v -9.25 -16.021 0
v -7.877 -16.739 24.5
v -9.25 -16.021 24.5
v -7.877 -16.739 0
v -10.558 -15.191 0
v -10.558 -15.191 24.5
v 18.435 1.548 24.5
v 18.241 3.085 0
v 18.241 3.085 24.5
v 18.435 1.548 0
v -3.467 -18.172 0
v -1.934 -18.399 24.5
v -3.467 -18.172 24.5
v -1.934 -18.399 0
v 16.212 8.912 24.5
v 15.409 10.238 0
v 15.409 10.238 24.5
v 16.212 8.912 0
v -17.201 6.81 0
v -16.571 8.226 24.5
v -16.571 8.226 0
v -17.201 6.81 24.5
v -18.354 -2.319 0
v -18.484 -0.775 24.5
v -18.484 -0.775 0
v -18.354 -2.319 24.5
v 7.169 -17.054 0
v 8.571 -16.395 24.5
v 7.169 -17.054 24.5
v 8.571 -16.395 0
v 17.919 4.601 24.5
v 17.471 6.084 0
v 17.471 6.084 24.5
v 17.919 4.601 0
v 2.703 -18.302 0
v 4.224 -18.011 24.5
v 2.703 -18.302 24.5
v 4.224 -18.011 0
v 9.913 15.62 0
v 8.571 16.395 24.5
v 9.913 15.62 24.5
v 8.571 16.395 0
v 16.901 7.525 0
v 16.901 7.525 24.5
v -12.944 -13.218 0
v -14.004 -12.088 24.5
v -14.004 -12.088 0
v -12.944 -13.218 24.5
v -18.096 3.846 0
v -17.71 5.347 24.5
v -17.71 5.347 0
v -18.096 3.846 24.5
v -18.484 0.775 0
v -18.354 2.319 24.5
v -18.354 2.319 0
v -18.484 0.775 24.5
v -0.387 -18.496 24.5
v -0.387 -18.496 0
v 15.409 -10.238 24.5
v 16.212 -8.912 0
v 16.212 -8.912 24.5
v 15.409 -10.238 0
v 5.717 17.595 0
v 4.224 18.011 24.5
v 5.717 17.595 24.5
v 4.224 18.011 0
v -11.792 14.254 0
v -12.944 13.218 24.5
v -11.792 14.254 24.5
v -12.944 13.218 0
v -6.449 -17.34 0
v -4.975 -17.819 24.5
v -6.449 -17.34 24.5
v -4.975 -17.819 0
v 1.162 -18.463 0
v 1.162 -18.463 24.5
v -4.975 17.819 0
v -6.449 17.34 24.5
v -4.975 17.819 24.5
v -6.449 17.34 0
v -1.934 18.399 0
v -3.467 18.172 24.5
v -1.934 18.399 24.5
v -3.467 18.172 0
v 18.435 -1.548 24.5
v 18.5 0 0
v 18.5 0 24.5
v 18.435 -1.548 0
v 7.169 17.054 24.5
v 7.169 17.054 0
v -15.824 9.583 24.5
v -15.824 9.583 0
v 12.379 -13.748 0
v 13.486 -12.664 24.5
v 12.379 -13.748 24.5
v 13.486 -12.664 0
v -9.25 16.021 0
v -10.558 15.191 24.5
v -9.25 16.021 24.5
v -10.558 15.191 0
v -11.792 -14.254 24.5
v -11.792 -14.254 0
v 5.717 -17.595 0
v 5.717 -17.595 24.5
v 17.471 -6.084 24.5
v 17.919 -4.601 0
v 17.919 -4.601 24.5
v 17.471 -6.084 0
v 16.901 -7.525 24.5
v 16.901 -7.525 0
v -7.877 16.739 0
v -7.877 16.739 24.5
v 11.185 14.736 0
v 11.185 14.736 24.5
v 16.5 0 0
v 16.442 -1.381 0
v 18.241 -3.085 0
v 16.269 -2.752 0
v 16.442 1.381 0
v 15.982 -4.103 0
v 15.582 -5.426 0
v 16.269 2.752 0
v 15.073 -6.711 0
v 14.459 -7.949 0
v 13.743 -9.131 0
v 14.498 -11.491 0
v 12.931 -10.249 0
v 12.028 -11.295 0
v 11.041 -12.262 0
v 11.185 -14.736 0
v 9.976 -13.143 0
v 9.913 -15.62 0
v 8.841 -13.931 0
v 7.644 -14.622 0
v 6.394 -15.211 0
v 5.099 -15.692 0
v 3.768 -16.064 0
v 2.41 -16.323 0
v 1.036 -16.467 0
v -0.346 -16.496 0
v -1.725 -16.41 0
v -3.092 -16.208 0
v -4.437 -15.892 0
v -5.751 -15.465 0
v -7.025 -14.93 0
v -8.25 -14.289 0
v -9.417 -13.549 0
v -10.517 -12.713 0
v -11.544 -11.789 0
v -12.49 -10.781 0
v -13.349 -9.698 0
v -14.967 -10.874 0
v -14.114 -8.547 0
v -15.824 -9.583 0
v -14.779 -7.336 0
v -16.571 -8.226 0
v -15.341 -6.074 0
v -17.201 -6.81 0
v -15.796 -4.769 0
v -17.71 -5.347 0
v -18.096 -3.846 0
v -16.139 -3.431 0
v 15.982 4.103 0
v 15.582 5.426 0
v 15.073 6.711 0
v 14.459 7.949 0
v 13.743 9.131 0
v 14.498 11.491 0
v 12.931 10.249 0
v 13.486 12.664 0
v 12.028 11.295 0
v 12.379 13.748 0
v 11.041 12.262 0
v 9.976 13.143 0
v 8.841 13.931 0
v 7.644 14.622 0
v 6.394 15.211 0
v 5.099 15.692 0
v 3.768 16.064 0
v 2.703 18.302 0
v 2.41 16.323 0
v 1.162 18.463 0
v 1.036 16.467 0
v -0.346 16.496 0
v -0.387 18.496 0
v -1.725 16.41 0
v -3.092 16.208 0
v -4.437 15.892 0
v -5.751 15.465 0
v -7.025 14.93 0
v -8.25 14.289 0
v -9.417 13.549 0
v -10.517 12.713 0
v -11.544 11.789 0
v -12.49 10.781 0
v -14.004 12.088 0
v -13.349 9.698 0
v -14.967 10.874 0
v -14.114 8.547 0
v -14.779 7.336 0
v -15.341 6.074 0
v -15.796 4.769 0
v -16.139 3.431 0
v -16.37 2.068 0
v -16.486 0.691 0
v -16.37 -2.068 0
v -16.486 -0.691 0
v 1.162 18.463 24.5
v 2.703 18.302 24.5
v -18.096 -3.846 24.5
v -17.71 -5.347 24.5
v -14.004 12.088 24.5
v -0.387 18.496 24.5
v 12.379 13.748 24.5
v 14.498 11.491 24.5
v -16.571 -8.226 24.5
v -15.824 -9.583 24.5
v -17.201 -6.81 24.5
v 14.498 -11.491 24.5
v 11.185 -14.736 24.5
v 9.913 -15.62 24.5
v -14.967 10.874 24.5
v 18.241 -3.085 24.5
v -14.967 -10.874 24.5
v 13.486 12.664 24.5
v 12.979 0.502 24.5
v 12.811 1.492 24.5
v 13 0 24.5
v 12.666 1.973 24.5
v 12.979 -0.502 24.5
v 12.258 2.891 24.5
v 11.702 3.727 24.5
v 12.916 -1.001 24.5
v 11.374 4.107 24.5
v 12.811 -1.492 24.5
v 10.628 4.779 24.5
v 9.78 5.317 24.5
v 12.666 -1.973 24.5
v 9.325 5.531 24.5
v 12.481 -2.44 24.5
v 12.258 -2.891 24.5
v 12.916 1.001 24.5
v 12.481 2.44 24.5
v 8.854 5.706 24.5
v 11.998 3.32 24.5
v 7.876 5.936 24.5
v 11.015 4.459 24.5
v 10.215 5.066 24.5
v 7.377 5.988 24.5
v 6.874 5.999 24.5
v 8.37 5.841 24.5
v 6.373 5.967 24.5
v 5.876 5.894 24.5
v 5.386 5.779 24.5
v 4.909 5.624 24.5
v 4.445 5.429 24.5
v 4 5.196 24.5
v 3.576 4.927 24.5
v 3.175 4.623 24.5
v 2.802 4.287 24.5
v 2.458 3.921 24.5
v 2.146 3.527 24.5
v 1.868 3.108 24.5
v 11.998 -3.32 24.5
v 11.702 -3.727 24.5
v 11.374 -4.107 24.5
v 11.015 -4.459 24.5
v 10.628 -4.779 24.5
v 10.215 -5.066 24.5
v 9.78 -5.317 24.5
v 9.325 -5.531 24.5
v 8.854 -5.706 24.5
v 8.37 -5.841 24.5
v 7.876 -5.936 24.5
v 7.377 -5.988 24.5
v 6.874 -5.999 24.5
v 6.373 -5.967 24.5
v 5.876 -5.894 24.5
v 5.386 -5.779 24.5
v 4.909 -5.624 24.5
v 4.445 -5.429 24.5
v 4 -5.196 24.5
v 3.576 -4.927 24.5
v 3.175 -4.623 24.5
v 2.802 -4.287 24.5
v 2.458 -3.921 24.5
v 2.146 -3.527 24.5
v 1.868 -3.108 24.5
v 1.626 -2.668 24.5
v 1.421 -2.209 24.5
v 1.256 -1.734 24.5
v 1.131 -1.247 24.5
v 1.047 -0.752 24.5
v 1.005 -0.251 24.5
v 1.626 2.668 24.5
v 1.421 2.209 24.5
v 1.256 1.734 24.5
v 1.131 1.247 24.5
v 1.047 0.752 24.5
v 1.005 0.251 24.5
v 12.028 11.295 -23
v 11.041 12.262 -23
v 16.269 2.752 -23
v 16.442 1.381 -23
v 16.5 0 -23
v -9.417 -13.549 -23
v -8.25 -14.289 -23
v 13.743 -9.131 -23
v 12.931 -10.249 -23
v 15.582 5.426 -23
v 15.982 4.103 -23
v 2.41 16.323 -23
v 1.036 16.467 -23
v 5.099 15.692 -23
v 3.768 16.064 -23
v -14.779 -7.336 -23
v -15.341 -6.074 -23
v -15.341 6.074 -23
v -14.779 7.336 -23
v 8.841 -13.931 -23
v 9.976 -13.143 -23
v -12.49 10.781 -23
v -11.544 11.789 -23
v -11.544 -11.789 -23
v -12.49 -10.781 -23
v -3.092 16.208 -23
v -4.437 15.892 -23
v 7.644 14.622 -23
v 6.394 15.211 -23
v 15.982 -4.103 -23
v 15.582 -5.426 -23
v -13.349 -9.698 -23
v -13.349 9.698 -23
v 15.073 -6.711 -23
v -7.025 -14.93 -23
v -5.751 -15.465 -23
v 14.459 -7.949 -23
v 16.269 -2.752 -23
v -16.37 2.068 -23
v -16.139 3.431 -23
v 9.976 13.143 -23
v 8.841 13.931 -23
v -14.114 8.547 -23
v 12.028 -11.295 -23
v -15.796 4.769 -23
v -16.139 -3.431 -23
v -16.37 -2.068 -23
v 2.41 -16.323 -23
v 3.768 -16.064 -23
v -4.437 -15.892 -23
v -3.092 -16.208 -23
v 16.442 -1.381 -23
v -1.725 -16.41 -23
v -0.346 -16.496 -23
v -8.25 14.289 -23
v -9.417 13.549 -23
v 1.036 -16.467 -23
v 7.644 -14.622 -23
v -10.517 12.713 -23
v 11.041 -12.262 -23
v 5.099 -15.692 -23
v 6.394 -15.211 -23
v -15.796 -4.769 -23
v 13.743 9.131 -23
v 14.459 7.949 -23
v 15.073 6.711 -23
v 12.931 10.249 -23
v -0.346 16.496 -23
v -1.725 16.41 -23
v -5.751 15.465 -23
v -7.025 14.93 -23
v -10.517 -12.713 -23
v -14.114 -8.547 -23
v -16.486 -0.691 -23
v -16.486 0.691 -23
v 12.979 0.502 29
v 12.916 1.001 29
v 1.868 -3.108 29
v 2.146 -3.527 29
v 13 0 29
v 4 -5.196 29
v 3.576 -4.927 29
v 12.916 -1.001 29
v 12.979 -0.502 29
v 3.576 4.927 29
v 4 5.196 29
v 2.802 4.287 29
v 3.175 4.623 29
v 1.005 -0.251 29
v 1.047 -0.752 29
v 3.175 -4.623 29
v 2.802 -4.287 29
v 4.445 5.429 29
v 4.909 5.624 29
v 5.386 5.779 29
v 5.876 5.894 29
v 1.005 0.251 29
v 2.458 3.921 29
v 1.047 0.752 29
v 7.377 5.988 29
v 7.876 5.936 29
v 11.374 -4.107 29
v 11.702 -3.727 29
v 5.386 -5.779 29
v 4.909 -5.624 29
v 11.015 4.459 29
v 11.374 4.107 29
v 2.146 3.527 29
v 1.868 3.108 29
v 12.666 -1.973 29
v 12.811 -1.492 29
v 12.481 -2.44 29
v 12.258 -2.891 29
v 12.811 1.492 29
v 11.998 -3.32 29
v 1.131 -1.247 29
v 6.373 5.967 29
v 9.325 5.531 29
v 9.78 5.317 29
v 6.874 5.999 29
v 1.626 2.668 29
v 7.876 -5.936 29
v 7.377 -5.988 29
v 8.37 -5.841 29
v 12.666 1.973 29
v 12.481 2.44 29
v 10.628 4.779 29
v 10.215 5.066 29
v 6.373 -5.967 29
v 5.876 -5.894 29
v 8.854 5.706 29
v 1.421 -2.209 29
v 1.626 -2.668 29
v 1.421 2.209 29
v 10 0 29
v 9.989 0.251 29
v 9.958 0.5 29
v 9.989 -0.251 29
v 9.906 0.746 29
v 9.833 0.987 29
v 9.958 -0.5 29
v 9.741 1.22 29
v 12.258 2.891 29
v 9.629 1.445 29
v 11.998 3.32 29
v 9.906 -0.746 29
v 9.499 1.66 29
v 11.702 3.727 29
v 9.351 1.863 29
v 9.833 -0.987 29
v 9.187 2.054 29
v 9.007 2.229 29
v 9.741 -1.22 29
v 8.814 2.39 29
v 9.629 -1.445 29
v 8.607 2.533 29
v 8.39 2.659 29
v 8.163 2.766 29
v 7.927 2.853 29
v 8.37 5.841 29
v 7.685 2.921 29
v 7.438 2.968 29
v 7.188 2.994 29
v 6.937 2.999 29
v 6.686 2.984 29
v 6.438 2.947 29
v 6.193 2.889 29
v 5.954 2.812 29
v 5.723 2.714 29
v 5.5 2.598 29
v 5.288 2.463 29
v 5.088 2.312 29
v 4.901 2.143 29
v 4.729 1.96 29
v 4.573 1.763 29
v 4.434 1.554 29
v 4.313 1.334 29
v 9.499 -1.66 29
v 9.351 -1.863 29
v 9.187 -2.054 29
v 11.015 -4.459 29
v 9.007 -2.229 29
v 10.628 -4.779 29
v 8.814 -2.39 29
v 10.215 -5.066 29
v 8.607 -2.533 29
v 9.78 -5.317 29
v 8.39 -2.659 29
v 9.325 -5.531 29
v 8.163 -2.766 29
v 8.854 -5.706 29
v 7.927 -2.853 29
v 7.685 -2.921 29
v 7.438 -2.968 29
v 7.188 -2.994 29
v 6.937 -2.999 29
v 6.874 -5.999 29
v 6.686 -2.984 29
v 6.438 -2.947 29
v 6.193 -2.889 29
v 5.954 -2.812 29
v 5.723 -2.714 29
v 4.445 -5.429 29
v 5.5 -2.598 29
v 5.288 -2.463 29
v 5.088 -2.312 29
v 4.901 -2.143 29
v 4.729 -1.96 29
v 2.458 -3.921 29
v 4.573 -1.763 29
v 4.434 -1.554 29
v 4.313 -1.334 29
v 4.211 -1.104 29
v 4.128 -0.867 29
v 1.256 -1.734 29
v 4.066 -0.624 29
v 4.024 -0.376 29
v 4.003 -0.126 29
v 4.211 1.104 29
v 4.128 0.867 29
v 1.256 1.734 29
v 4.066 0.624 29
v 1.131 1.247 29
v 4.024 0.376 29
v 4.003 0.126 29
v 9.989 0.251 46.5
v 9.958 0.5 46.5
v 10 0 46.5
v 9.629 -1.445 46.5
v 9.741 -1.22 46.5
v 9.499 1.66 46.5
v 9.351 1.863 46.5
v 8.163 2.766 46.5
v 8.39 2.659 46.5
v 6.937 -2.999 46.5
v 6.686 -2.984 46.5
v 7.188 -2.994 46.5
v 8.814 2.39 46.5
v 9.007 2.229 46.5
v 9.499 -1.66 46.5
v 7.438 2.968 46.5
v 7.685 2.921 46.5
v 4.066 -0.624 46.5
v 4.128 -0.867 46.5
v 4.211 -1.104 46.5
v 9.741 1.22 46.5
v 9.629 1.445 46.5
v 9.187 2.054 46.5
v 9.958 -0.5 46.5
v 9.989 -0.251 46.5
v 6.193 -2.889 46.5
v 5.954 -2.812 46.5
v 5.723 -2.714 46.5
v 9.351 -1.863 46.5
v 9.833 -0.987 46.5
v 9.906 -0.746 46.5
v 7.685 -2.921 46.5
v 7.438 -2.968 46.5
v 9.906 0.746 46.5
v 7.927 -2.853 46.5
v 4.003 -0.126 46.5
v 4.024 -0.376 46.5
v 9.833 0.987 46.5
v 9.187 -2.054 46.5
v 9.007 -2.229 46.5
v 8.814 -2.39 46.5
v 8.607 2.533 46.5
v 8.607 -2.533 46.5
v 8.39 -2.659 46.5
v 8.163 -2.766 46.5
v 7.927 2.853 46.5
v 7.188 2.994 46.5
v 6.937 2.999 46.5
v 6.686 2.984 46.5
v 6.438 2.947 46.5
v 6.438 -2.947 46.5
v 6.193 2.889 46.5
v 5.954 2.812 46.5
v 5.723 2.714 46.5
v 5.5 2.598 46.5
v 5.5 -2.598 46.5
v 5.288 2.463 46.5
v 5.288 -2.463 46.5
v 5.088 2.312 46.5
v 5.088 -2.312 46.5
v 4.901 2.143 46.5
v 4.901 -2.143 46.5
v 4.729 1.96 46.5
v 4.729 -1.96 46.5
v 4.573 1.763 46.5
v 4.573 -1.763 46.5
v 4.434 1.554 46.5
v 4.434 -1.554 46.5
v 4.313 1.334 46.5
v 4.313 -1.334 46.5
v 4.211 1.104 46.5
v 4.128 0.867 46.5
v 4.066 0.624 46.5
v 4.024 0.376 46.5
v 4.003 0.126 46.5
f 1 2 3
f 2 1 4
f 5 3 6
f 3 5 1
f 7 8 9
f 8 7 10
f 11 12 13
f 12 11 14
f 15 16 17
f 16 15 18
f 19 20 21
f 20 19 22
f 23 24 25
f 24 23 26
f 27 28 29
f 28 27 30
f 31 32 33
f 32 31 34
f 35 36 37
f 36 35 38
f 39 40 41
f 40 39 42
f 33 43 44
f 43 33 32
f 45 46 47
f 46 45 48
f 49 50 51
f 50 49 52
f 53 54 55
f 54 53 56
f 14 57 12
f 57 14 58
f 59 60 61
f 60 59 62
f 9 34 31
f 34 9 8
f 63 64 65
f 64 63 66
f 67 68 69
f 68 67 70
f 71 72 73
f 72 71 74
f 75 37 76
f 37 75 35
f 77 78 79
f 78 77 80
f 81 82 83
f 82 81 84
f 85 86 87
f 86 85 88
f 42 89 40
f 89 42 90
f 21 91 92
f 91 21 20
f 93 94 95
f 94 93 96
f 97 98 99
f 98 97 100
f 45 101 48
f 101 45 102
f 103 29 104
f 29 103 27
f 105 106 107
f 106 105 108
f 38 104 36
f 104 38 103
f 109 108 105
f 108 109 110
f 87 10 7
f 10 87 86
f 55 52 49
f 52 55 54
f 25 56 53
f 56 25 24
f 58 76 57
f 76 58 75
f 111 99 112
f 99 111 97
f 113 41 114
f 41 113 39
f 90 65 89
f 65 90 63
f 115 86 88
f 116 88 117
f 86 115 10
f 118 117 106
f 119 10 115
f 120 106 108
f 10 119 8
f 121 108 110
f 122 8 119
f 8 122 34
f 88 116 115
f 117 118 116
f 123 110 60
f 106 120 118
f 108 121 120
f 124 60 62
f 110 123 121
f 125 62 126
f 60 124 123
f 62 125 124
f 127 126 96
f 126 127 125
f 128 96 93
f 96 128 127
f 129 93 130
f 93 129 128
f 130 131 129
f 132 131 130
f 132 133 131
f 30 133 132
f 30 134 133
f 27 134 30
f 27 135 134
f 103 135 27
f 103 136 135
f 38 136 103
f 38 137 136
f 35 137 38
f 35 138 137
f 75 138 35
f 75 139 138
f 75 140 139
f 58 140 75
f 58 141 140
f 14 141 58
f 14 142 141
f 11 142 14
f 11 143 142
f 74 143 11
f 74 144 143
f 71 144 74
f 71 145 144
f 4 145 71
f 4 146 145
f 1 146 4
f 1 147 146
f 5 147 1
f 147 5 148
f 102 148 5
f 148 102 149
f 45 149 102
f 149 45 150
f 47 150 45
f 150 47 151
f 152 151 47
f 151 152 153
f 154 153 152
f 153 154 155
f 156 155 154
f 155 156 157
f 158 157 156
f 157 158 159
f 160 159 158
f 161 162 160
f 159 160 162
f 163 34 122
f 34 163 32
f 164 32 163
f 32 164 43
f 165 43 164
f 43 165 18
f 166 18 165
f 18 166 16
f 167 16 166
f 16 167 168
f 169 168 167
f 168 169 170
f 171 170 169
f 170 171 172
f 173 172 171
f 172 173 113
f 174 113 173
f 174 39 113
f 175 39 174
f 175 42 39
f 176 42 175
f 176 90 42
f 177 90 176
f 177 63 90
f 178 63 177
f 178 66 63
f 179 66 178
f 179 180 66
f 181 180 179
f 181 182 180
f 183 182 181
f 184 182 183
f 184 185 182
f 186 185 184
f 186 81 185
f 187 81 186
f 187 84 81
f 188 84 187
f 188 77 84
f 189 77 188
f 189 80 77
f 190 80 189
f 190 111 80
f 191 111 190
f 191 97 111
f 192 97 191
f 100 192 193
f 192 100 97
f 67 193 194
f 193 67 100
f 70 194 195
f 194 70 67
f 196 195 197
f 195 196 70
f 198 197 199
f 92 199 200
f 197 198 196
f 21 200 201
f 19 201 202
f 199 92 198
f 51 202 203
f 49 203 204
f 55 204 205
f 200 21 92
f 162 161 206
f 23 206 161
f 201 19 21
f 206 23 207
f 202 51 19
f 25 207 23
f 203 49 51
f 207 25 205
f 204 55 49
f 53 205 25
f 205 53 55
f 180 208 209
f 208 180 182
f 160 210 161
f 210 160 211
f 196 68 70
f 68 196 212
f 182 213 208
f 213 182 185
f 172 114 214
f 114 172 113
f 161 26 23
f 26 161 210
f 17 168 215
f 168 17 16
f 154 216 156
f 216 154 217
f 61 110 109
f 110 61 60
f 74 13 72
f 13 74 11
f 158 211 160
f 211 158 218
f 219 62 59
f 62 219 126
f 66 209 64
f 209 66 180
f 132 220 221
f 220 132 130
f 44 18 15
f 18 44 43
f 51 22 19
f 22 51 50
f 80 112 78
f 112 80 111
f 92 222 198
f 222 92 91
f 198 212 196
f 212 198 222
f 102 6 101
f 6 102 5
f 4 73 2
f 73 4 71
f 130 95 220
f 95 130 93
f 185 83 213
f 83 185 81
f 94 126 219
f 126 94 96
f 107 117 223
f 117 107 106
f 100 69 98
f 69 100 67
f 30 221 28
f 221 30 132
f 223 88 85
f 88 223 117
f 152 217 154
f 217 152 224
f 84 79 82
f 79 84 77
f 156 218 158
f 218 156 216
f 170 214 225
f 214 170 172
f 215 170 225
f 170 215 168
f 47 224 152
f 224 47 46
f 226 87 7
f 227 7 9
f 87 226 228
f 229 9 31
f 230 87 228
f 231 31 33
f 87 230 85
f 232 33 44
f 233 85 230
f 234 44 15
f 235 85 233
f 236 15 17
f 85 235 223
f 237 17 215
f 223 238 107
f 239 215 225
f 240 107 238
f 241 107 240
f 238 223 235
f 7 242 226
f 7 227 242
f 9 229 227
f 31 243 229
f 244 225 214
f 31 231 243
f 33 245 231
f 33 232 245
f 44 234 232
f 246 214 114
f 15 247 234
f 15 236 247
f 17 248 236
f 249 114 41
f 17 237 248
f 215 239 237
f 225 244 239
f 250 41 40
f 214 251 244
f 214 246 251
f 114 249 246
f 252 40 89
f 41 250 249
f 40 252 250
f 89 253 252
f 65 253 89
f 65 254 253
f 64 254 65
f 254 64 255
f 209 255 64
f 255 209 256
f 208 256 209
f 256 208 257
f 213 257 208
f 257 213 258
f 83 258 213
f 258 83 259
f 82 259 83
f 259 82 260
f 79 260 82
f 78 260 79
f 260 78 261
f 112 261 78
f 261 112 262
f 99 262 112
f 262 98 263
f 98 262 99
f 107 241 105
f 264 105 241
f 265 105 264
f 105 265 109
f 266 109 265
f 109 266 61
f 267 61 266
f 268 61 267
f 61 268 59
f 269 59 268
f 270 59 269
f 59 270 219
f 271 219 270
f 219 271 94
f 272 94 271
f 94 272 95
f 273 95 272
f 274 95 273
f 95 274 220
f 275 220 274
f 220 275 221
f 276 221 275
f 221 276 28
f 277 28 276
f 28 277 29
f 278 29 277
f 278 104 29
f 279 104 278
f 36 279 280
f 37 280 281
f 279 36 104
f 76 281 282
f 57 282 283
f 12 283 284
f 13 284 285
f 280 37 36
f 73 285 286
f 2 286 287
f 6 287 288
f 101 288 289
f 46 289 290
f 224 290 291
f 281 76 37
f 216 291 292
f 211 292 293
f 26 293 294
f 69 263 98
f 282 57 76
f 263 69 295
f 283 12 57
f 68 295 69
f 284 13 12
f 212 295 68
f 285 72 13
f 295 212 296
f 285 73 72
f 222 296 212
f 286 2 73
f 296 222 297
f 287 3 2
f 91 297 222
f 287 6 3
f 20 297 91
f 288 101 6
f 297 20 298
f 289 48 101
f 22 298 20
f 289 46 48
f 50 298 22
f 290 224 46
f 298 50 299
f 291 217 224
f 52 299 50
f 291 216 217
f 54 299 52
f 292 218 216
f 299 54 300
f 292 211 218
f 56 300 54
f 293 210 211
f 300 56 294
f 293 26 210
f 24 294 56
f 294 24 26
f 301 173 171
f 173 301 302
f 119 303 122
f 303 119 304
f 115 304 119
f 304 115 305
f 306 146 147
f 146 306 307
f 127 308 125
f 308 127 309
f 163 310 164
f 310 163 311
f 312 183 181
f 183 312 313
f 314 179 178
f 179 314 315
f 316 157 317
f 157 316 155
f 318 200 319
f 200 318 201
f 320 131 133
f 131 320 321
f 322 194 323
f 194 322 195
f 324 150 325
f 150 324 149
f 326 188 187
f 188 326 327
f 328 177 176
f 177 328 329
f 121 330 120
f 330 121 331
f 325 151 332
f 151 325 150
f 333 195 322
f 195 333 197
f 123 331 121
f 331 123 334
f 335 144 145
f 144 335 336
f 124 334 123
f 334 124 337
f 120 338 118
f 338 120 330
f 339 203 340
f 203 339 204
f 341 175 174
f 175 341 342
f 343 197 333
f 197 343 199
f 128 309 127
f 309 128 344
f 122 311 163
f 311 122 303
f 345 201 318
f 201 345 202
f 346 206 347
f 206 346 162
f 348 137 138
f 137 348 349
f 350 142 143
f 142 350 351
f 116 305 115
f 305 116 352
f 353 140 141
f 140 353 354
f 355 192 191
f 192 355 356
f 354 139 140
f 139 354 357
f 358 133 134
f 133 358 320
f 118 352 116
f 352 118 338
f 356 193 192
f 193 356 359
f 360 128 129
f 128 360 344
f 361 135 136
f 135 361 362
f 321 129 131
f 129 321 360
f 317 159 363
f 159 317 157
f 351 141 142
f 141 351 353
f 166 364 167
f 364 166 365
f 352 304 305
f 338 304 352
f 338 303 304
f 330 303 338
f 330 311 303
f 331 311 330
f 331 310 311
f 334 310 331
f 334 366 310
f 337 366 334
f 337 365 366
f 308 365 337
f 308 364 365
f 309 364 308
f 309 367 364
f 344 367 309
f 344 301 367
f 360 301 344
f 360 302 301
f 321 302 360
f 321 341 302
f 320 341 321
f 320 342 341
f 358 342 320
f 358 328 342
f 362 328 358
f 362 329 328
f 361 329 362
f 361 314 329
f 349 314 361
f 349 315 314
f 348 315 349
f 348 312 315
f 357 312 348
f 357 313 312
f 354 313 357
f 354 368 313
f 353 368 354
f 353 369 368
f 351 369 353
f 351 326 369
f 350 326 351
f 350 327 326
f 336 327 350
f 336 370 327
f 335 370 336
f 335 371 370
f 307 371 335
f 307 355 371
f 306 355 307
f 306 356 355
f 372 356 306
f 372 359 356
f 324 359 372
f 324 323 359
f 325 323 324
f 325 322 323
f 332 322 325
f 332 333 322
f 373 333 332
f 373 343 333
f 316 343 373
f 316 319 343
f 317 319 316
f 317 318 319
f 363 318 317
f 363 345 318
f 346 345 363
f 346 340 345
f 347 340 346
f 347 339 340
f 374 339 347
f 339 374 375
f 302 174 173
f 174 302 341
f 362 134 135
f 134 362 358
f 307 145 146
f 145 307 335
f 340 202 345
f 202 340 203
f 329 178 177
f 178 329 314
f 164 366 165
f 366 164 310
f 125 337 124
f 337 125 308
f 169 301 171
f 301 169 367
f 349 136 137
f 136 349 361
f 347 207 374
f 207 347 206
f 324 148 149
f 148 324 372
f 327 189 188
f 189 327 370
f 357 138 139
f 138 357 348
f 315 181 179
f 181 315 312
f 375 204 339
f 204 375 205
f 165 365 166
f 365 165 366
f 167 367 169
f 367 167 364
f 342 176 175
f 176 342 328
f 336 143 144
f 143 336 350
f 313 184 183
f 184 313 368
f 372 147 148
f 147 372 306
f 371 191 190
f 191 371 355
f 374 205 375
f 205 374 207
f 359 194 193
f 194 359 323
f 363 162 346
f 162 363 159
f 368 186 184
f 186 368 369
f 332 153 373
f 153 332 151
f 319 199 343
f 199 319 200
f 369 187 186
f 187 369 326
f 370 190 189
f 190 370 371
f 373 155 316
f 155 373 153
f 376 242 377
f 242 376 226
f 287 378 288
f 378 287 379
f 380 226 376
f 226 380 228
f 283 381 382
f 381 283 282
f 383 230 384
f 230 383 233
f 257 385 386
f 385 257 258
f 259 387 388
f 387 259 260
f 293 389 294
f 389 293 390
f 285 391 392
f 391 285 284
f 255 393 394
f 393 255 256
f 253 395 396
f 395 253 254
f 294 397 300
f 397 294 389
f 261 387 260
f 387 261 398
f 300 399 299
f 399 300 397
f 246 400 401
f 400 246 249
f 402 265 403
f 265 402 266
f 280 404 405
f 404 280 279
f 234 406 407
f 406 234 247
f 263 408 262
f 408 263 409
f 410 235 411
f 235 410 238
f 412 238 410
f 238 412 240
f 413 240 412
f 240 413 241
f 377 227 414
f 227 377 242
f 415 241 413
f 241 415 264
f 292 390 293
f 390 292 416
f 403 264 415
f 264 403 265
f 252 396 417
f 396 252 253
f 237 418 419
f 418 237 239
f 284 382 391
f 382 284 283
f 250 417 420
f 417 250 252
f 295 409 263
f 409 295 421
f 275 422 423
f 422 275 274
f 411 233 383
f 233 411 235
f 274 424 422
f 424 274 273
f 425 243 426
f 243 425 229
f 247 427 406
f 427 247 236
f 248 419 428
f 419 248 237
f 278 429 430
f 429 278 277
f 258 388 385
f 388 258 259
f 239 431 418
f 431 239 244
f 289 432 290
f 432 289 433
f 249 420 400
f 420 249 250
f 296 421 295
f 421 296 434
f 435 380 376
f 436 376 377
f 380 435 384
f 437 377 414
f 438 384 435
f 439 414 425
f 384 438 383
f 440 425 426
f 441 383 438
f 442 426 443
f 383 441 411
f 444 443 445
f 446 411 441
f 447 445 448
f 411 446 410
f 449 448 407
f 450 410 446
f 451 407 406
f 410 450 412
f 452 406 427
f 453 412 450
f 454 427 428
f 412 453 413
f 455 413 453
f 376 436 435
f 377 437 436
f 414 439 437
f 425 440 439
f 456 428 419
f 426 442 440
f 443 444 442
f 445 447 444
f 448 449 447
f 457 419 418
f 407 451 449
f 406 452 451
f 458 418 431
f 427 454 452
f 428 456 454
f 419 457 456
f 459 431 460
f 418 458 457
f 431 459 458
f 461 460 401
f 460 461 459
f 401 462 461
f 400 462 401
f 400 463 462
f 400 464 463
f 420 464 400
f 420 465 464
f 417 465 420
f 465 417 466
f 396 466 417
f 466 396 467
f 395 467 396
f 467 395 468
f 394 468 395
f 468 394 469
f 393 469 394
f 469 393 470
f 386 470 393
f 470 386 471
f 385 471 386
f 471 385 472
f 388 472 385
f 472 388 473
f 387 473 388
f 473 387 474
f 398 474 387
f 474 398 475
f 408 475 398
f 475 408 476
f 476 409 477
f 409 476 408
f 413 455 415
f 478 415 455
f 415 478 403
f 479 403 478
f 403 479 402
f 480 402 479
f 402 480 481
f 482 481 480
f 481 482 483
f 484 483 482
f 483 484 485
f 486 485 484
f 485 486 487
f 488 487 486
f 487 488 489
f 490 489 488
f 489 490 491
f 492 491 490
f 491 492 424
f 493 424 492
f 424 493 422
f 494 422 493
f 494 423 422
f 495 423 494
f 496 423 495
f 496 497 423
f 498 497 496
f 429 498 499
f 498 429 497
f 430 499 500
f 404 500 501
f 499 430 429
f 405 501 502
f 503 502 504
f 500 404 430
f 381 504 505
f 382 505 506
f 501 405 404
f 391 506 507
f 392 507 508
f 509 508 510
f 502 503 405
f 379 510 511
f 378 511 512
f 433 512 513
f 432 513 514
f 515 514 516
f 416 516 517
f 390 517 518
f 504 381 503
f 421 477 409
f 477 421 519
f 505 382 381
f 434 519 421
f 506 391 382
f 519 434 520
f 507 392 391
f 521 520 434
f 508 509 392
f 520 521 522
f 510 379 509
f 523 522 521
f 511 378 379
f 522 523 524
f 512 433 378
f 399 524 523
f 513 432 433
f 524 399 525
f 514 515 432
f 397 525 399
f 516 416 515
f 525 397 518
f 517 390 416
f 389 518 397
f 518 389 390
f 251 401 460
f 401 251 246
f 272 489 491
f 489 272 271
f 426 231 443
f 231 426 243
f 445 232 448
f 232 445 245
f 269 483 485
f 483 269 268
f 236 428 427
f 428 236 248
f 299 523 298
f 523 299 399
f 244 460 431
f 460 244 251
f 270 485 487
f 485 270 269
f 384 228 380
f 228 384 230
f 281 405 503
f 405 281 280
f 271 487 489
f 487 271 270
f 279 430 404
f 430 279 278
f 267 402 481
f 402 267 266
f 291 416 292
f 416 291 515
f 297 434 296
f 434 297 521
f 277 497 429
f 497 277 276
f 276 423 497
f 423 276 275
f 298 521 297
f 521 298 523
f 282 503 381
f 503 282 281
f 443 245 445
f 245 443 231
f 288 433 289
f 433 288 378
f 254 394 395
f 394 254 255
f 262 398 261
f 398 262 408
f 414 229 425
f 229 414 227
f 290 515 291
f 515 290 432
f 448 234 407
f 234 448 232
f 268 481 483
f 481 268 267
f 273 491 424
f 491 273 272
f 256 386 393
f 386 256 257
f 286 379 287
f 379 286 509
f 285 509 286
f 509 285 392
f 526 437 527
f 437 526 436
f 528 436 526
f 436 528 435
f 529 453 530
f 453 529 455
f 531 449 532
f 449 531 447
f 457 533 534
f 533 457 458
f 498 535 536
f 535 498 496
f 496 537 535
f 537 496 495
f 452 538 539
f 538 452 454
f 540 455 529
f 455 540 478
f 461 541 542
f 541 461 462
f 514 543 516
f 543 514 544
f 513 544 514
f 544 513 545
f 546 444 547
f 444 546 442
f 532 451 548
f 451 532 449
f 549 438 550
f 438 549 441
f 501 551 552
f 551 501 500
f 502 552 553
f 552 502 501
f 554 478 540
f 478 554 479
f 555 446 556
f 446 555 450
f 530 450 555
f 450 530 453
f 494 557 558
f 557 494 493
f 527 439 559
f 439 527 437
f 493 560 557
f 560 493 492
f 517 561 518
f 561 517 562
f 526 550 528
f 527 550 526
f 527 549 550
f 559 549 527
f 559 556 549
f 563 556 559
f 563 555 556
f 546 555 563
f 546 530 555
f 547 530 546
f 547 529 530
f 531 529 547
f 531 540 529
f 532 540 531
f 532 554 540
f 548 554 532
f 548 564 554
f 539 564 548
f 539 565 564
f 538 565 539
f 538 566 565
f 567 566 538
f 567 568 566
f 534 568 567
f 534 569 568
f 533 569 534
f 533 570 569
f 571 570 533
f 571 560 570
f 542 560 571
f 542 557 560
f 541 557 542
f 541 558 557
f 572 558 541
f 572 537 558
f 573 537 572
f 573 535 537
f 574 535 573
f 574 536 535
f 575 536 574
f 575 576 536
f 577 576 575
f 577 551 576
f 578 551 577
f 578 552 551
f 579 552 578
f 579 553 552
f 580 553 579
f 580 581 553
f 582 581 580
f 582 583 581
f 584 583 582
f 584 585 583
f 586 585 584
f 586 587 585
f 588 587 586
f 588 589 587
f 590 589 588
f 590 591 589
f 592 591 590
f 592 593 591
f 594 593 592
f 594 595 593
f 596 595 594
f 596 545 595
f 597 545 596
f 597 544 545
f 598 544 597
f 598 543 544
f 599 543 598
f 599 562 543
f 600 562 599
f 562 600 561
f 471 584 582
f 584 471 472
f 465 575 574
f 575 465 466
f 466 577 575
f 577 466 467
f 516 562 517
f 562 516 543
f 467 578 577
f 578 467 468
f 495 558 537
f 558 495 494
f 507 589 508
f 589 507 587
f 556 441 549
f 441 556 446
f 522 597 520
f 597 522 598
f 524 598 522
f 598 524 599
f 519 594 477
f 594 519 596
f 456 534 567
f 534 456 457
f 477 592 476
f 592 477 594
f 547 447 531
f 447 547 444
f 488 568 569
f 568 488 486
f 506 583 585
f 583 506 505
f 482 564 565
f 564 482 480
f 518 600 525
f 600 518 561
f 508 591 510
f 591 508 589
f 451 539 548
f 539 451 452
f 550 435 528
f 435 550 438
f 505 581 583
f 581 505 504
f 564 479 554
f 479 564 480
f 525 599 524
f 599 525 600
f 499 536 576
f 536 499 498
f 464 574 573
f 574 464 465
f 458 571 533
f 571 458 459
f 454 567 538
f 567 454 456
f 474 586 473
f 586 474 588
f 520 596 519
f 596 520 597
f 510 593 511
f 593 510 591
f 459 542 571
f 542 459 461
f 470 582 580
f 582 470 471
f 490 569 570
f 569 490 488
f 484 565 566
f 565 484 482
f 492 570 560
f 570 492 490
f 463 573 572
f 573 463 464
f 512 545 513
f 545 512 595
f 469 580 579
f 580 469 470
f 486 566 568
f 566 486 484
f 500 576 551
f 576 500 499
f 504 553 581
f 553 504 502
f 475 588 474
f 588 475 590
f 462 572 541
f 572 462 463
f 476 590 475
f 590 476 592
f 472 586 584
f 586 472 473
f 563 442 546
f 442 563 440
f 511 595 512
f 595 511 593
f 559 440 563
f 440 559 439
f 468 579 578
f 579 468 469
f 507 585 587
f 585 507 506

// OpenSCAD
$fn=75;

module motor(){
    gearboxDia   = 37/2;
    gearboxDepth = 24.5;
    motorDia     = 33/2;
    motorDepth   = 23;
    depth        = gearboxDepth + motorDepth;
    shaftBearing = 12/2;
    shaftBheight = 4.5;
    shaftDia     = 6/2;
    shaftLen     = 22;
    shaftOffset  = 10 - shaftDia;
    
    //gearbox
    linear_extrude(gearboxDepth)
        circle(gearboxDia);
    
    //motor
    translate([0,0,-motorDepth])
    linear_extrude(motorDepth)
        circle(motorDia);
    
    //shaft bearing
    translate([shaftOffset,0,0+gearboxDepth])
    linear_extrude(shaftBheight)
        circle(shaftBearing);
    
    //shaft
    translate([shaftOffset,0,0+gearboxDepth])
    linear_extrude(shaftLen)
        circle(shaftDia);
}

motor();
